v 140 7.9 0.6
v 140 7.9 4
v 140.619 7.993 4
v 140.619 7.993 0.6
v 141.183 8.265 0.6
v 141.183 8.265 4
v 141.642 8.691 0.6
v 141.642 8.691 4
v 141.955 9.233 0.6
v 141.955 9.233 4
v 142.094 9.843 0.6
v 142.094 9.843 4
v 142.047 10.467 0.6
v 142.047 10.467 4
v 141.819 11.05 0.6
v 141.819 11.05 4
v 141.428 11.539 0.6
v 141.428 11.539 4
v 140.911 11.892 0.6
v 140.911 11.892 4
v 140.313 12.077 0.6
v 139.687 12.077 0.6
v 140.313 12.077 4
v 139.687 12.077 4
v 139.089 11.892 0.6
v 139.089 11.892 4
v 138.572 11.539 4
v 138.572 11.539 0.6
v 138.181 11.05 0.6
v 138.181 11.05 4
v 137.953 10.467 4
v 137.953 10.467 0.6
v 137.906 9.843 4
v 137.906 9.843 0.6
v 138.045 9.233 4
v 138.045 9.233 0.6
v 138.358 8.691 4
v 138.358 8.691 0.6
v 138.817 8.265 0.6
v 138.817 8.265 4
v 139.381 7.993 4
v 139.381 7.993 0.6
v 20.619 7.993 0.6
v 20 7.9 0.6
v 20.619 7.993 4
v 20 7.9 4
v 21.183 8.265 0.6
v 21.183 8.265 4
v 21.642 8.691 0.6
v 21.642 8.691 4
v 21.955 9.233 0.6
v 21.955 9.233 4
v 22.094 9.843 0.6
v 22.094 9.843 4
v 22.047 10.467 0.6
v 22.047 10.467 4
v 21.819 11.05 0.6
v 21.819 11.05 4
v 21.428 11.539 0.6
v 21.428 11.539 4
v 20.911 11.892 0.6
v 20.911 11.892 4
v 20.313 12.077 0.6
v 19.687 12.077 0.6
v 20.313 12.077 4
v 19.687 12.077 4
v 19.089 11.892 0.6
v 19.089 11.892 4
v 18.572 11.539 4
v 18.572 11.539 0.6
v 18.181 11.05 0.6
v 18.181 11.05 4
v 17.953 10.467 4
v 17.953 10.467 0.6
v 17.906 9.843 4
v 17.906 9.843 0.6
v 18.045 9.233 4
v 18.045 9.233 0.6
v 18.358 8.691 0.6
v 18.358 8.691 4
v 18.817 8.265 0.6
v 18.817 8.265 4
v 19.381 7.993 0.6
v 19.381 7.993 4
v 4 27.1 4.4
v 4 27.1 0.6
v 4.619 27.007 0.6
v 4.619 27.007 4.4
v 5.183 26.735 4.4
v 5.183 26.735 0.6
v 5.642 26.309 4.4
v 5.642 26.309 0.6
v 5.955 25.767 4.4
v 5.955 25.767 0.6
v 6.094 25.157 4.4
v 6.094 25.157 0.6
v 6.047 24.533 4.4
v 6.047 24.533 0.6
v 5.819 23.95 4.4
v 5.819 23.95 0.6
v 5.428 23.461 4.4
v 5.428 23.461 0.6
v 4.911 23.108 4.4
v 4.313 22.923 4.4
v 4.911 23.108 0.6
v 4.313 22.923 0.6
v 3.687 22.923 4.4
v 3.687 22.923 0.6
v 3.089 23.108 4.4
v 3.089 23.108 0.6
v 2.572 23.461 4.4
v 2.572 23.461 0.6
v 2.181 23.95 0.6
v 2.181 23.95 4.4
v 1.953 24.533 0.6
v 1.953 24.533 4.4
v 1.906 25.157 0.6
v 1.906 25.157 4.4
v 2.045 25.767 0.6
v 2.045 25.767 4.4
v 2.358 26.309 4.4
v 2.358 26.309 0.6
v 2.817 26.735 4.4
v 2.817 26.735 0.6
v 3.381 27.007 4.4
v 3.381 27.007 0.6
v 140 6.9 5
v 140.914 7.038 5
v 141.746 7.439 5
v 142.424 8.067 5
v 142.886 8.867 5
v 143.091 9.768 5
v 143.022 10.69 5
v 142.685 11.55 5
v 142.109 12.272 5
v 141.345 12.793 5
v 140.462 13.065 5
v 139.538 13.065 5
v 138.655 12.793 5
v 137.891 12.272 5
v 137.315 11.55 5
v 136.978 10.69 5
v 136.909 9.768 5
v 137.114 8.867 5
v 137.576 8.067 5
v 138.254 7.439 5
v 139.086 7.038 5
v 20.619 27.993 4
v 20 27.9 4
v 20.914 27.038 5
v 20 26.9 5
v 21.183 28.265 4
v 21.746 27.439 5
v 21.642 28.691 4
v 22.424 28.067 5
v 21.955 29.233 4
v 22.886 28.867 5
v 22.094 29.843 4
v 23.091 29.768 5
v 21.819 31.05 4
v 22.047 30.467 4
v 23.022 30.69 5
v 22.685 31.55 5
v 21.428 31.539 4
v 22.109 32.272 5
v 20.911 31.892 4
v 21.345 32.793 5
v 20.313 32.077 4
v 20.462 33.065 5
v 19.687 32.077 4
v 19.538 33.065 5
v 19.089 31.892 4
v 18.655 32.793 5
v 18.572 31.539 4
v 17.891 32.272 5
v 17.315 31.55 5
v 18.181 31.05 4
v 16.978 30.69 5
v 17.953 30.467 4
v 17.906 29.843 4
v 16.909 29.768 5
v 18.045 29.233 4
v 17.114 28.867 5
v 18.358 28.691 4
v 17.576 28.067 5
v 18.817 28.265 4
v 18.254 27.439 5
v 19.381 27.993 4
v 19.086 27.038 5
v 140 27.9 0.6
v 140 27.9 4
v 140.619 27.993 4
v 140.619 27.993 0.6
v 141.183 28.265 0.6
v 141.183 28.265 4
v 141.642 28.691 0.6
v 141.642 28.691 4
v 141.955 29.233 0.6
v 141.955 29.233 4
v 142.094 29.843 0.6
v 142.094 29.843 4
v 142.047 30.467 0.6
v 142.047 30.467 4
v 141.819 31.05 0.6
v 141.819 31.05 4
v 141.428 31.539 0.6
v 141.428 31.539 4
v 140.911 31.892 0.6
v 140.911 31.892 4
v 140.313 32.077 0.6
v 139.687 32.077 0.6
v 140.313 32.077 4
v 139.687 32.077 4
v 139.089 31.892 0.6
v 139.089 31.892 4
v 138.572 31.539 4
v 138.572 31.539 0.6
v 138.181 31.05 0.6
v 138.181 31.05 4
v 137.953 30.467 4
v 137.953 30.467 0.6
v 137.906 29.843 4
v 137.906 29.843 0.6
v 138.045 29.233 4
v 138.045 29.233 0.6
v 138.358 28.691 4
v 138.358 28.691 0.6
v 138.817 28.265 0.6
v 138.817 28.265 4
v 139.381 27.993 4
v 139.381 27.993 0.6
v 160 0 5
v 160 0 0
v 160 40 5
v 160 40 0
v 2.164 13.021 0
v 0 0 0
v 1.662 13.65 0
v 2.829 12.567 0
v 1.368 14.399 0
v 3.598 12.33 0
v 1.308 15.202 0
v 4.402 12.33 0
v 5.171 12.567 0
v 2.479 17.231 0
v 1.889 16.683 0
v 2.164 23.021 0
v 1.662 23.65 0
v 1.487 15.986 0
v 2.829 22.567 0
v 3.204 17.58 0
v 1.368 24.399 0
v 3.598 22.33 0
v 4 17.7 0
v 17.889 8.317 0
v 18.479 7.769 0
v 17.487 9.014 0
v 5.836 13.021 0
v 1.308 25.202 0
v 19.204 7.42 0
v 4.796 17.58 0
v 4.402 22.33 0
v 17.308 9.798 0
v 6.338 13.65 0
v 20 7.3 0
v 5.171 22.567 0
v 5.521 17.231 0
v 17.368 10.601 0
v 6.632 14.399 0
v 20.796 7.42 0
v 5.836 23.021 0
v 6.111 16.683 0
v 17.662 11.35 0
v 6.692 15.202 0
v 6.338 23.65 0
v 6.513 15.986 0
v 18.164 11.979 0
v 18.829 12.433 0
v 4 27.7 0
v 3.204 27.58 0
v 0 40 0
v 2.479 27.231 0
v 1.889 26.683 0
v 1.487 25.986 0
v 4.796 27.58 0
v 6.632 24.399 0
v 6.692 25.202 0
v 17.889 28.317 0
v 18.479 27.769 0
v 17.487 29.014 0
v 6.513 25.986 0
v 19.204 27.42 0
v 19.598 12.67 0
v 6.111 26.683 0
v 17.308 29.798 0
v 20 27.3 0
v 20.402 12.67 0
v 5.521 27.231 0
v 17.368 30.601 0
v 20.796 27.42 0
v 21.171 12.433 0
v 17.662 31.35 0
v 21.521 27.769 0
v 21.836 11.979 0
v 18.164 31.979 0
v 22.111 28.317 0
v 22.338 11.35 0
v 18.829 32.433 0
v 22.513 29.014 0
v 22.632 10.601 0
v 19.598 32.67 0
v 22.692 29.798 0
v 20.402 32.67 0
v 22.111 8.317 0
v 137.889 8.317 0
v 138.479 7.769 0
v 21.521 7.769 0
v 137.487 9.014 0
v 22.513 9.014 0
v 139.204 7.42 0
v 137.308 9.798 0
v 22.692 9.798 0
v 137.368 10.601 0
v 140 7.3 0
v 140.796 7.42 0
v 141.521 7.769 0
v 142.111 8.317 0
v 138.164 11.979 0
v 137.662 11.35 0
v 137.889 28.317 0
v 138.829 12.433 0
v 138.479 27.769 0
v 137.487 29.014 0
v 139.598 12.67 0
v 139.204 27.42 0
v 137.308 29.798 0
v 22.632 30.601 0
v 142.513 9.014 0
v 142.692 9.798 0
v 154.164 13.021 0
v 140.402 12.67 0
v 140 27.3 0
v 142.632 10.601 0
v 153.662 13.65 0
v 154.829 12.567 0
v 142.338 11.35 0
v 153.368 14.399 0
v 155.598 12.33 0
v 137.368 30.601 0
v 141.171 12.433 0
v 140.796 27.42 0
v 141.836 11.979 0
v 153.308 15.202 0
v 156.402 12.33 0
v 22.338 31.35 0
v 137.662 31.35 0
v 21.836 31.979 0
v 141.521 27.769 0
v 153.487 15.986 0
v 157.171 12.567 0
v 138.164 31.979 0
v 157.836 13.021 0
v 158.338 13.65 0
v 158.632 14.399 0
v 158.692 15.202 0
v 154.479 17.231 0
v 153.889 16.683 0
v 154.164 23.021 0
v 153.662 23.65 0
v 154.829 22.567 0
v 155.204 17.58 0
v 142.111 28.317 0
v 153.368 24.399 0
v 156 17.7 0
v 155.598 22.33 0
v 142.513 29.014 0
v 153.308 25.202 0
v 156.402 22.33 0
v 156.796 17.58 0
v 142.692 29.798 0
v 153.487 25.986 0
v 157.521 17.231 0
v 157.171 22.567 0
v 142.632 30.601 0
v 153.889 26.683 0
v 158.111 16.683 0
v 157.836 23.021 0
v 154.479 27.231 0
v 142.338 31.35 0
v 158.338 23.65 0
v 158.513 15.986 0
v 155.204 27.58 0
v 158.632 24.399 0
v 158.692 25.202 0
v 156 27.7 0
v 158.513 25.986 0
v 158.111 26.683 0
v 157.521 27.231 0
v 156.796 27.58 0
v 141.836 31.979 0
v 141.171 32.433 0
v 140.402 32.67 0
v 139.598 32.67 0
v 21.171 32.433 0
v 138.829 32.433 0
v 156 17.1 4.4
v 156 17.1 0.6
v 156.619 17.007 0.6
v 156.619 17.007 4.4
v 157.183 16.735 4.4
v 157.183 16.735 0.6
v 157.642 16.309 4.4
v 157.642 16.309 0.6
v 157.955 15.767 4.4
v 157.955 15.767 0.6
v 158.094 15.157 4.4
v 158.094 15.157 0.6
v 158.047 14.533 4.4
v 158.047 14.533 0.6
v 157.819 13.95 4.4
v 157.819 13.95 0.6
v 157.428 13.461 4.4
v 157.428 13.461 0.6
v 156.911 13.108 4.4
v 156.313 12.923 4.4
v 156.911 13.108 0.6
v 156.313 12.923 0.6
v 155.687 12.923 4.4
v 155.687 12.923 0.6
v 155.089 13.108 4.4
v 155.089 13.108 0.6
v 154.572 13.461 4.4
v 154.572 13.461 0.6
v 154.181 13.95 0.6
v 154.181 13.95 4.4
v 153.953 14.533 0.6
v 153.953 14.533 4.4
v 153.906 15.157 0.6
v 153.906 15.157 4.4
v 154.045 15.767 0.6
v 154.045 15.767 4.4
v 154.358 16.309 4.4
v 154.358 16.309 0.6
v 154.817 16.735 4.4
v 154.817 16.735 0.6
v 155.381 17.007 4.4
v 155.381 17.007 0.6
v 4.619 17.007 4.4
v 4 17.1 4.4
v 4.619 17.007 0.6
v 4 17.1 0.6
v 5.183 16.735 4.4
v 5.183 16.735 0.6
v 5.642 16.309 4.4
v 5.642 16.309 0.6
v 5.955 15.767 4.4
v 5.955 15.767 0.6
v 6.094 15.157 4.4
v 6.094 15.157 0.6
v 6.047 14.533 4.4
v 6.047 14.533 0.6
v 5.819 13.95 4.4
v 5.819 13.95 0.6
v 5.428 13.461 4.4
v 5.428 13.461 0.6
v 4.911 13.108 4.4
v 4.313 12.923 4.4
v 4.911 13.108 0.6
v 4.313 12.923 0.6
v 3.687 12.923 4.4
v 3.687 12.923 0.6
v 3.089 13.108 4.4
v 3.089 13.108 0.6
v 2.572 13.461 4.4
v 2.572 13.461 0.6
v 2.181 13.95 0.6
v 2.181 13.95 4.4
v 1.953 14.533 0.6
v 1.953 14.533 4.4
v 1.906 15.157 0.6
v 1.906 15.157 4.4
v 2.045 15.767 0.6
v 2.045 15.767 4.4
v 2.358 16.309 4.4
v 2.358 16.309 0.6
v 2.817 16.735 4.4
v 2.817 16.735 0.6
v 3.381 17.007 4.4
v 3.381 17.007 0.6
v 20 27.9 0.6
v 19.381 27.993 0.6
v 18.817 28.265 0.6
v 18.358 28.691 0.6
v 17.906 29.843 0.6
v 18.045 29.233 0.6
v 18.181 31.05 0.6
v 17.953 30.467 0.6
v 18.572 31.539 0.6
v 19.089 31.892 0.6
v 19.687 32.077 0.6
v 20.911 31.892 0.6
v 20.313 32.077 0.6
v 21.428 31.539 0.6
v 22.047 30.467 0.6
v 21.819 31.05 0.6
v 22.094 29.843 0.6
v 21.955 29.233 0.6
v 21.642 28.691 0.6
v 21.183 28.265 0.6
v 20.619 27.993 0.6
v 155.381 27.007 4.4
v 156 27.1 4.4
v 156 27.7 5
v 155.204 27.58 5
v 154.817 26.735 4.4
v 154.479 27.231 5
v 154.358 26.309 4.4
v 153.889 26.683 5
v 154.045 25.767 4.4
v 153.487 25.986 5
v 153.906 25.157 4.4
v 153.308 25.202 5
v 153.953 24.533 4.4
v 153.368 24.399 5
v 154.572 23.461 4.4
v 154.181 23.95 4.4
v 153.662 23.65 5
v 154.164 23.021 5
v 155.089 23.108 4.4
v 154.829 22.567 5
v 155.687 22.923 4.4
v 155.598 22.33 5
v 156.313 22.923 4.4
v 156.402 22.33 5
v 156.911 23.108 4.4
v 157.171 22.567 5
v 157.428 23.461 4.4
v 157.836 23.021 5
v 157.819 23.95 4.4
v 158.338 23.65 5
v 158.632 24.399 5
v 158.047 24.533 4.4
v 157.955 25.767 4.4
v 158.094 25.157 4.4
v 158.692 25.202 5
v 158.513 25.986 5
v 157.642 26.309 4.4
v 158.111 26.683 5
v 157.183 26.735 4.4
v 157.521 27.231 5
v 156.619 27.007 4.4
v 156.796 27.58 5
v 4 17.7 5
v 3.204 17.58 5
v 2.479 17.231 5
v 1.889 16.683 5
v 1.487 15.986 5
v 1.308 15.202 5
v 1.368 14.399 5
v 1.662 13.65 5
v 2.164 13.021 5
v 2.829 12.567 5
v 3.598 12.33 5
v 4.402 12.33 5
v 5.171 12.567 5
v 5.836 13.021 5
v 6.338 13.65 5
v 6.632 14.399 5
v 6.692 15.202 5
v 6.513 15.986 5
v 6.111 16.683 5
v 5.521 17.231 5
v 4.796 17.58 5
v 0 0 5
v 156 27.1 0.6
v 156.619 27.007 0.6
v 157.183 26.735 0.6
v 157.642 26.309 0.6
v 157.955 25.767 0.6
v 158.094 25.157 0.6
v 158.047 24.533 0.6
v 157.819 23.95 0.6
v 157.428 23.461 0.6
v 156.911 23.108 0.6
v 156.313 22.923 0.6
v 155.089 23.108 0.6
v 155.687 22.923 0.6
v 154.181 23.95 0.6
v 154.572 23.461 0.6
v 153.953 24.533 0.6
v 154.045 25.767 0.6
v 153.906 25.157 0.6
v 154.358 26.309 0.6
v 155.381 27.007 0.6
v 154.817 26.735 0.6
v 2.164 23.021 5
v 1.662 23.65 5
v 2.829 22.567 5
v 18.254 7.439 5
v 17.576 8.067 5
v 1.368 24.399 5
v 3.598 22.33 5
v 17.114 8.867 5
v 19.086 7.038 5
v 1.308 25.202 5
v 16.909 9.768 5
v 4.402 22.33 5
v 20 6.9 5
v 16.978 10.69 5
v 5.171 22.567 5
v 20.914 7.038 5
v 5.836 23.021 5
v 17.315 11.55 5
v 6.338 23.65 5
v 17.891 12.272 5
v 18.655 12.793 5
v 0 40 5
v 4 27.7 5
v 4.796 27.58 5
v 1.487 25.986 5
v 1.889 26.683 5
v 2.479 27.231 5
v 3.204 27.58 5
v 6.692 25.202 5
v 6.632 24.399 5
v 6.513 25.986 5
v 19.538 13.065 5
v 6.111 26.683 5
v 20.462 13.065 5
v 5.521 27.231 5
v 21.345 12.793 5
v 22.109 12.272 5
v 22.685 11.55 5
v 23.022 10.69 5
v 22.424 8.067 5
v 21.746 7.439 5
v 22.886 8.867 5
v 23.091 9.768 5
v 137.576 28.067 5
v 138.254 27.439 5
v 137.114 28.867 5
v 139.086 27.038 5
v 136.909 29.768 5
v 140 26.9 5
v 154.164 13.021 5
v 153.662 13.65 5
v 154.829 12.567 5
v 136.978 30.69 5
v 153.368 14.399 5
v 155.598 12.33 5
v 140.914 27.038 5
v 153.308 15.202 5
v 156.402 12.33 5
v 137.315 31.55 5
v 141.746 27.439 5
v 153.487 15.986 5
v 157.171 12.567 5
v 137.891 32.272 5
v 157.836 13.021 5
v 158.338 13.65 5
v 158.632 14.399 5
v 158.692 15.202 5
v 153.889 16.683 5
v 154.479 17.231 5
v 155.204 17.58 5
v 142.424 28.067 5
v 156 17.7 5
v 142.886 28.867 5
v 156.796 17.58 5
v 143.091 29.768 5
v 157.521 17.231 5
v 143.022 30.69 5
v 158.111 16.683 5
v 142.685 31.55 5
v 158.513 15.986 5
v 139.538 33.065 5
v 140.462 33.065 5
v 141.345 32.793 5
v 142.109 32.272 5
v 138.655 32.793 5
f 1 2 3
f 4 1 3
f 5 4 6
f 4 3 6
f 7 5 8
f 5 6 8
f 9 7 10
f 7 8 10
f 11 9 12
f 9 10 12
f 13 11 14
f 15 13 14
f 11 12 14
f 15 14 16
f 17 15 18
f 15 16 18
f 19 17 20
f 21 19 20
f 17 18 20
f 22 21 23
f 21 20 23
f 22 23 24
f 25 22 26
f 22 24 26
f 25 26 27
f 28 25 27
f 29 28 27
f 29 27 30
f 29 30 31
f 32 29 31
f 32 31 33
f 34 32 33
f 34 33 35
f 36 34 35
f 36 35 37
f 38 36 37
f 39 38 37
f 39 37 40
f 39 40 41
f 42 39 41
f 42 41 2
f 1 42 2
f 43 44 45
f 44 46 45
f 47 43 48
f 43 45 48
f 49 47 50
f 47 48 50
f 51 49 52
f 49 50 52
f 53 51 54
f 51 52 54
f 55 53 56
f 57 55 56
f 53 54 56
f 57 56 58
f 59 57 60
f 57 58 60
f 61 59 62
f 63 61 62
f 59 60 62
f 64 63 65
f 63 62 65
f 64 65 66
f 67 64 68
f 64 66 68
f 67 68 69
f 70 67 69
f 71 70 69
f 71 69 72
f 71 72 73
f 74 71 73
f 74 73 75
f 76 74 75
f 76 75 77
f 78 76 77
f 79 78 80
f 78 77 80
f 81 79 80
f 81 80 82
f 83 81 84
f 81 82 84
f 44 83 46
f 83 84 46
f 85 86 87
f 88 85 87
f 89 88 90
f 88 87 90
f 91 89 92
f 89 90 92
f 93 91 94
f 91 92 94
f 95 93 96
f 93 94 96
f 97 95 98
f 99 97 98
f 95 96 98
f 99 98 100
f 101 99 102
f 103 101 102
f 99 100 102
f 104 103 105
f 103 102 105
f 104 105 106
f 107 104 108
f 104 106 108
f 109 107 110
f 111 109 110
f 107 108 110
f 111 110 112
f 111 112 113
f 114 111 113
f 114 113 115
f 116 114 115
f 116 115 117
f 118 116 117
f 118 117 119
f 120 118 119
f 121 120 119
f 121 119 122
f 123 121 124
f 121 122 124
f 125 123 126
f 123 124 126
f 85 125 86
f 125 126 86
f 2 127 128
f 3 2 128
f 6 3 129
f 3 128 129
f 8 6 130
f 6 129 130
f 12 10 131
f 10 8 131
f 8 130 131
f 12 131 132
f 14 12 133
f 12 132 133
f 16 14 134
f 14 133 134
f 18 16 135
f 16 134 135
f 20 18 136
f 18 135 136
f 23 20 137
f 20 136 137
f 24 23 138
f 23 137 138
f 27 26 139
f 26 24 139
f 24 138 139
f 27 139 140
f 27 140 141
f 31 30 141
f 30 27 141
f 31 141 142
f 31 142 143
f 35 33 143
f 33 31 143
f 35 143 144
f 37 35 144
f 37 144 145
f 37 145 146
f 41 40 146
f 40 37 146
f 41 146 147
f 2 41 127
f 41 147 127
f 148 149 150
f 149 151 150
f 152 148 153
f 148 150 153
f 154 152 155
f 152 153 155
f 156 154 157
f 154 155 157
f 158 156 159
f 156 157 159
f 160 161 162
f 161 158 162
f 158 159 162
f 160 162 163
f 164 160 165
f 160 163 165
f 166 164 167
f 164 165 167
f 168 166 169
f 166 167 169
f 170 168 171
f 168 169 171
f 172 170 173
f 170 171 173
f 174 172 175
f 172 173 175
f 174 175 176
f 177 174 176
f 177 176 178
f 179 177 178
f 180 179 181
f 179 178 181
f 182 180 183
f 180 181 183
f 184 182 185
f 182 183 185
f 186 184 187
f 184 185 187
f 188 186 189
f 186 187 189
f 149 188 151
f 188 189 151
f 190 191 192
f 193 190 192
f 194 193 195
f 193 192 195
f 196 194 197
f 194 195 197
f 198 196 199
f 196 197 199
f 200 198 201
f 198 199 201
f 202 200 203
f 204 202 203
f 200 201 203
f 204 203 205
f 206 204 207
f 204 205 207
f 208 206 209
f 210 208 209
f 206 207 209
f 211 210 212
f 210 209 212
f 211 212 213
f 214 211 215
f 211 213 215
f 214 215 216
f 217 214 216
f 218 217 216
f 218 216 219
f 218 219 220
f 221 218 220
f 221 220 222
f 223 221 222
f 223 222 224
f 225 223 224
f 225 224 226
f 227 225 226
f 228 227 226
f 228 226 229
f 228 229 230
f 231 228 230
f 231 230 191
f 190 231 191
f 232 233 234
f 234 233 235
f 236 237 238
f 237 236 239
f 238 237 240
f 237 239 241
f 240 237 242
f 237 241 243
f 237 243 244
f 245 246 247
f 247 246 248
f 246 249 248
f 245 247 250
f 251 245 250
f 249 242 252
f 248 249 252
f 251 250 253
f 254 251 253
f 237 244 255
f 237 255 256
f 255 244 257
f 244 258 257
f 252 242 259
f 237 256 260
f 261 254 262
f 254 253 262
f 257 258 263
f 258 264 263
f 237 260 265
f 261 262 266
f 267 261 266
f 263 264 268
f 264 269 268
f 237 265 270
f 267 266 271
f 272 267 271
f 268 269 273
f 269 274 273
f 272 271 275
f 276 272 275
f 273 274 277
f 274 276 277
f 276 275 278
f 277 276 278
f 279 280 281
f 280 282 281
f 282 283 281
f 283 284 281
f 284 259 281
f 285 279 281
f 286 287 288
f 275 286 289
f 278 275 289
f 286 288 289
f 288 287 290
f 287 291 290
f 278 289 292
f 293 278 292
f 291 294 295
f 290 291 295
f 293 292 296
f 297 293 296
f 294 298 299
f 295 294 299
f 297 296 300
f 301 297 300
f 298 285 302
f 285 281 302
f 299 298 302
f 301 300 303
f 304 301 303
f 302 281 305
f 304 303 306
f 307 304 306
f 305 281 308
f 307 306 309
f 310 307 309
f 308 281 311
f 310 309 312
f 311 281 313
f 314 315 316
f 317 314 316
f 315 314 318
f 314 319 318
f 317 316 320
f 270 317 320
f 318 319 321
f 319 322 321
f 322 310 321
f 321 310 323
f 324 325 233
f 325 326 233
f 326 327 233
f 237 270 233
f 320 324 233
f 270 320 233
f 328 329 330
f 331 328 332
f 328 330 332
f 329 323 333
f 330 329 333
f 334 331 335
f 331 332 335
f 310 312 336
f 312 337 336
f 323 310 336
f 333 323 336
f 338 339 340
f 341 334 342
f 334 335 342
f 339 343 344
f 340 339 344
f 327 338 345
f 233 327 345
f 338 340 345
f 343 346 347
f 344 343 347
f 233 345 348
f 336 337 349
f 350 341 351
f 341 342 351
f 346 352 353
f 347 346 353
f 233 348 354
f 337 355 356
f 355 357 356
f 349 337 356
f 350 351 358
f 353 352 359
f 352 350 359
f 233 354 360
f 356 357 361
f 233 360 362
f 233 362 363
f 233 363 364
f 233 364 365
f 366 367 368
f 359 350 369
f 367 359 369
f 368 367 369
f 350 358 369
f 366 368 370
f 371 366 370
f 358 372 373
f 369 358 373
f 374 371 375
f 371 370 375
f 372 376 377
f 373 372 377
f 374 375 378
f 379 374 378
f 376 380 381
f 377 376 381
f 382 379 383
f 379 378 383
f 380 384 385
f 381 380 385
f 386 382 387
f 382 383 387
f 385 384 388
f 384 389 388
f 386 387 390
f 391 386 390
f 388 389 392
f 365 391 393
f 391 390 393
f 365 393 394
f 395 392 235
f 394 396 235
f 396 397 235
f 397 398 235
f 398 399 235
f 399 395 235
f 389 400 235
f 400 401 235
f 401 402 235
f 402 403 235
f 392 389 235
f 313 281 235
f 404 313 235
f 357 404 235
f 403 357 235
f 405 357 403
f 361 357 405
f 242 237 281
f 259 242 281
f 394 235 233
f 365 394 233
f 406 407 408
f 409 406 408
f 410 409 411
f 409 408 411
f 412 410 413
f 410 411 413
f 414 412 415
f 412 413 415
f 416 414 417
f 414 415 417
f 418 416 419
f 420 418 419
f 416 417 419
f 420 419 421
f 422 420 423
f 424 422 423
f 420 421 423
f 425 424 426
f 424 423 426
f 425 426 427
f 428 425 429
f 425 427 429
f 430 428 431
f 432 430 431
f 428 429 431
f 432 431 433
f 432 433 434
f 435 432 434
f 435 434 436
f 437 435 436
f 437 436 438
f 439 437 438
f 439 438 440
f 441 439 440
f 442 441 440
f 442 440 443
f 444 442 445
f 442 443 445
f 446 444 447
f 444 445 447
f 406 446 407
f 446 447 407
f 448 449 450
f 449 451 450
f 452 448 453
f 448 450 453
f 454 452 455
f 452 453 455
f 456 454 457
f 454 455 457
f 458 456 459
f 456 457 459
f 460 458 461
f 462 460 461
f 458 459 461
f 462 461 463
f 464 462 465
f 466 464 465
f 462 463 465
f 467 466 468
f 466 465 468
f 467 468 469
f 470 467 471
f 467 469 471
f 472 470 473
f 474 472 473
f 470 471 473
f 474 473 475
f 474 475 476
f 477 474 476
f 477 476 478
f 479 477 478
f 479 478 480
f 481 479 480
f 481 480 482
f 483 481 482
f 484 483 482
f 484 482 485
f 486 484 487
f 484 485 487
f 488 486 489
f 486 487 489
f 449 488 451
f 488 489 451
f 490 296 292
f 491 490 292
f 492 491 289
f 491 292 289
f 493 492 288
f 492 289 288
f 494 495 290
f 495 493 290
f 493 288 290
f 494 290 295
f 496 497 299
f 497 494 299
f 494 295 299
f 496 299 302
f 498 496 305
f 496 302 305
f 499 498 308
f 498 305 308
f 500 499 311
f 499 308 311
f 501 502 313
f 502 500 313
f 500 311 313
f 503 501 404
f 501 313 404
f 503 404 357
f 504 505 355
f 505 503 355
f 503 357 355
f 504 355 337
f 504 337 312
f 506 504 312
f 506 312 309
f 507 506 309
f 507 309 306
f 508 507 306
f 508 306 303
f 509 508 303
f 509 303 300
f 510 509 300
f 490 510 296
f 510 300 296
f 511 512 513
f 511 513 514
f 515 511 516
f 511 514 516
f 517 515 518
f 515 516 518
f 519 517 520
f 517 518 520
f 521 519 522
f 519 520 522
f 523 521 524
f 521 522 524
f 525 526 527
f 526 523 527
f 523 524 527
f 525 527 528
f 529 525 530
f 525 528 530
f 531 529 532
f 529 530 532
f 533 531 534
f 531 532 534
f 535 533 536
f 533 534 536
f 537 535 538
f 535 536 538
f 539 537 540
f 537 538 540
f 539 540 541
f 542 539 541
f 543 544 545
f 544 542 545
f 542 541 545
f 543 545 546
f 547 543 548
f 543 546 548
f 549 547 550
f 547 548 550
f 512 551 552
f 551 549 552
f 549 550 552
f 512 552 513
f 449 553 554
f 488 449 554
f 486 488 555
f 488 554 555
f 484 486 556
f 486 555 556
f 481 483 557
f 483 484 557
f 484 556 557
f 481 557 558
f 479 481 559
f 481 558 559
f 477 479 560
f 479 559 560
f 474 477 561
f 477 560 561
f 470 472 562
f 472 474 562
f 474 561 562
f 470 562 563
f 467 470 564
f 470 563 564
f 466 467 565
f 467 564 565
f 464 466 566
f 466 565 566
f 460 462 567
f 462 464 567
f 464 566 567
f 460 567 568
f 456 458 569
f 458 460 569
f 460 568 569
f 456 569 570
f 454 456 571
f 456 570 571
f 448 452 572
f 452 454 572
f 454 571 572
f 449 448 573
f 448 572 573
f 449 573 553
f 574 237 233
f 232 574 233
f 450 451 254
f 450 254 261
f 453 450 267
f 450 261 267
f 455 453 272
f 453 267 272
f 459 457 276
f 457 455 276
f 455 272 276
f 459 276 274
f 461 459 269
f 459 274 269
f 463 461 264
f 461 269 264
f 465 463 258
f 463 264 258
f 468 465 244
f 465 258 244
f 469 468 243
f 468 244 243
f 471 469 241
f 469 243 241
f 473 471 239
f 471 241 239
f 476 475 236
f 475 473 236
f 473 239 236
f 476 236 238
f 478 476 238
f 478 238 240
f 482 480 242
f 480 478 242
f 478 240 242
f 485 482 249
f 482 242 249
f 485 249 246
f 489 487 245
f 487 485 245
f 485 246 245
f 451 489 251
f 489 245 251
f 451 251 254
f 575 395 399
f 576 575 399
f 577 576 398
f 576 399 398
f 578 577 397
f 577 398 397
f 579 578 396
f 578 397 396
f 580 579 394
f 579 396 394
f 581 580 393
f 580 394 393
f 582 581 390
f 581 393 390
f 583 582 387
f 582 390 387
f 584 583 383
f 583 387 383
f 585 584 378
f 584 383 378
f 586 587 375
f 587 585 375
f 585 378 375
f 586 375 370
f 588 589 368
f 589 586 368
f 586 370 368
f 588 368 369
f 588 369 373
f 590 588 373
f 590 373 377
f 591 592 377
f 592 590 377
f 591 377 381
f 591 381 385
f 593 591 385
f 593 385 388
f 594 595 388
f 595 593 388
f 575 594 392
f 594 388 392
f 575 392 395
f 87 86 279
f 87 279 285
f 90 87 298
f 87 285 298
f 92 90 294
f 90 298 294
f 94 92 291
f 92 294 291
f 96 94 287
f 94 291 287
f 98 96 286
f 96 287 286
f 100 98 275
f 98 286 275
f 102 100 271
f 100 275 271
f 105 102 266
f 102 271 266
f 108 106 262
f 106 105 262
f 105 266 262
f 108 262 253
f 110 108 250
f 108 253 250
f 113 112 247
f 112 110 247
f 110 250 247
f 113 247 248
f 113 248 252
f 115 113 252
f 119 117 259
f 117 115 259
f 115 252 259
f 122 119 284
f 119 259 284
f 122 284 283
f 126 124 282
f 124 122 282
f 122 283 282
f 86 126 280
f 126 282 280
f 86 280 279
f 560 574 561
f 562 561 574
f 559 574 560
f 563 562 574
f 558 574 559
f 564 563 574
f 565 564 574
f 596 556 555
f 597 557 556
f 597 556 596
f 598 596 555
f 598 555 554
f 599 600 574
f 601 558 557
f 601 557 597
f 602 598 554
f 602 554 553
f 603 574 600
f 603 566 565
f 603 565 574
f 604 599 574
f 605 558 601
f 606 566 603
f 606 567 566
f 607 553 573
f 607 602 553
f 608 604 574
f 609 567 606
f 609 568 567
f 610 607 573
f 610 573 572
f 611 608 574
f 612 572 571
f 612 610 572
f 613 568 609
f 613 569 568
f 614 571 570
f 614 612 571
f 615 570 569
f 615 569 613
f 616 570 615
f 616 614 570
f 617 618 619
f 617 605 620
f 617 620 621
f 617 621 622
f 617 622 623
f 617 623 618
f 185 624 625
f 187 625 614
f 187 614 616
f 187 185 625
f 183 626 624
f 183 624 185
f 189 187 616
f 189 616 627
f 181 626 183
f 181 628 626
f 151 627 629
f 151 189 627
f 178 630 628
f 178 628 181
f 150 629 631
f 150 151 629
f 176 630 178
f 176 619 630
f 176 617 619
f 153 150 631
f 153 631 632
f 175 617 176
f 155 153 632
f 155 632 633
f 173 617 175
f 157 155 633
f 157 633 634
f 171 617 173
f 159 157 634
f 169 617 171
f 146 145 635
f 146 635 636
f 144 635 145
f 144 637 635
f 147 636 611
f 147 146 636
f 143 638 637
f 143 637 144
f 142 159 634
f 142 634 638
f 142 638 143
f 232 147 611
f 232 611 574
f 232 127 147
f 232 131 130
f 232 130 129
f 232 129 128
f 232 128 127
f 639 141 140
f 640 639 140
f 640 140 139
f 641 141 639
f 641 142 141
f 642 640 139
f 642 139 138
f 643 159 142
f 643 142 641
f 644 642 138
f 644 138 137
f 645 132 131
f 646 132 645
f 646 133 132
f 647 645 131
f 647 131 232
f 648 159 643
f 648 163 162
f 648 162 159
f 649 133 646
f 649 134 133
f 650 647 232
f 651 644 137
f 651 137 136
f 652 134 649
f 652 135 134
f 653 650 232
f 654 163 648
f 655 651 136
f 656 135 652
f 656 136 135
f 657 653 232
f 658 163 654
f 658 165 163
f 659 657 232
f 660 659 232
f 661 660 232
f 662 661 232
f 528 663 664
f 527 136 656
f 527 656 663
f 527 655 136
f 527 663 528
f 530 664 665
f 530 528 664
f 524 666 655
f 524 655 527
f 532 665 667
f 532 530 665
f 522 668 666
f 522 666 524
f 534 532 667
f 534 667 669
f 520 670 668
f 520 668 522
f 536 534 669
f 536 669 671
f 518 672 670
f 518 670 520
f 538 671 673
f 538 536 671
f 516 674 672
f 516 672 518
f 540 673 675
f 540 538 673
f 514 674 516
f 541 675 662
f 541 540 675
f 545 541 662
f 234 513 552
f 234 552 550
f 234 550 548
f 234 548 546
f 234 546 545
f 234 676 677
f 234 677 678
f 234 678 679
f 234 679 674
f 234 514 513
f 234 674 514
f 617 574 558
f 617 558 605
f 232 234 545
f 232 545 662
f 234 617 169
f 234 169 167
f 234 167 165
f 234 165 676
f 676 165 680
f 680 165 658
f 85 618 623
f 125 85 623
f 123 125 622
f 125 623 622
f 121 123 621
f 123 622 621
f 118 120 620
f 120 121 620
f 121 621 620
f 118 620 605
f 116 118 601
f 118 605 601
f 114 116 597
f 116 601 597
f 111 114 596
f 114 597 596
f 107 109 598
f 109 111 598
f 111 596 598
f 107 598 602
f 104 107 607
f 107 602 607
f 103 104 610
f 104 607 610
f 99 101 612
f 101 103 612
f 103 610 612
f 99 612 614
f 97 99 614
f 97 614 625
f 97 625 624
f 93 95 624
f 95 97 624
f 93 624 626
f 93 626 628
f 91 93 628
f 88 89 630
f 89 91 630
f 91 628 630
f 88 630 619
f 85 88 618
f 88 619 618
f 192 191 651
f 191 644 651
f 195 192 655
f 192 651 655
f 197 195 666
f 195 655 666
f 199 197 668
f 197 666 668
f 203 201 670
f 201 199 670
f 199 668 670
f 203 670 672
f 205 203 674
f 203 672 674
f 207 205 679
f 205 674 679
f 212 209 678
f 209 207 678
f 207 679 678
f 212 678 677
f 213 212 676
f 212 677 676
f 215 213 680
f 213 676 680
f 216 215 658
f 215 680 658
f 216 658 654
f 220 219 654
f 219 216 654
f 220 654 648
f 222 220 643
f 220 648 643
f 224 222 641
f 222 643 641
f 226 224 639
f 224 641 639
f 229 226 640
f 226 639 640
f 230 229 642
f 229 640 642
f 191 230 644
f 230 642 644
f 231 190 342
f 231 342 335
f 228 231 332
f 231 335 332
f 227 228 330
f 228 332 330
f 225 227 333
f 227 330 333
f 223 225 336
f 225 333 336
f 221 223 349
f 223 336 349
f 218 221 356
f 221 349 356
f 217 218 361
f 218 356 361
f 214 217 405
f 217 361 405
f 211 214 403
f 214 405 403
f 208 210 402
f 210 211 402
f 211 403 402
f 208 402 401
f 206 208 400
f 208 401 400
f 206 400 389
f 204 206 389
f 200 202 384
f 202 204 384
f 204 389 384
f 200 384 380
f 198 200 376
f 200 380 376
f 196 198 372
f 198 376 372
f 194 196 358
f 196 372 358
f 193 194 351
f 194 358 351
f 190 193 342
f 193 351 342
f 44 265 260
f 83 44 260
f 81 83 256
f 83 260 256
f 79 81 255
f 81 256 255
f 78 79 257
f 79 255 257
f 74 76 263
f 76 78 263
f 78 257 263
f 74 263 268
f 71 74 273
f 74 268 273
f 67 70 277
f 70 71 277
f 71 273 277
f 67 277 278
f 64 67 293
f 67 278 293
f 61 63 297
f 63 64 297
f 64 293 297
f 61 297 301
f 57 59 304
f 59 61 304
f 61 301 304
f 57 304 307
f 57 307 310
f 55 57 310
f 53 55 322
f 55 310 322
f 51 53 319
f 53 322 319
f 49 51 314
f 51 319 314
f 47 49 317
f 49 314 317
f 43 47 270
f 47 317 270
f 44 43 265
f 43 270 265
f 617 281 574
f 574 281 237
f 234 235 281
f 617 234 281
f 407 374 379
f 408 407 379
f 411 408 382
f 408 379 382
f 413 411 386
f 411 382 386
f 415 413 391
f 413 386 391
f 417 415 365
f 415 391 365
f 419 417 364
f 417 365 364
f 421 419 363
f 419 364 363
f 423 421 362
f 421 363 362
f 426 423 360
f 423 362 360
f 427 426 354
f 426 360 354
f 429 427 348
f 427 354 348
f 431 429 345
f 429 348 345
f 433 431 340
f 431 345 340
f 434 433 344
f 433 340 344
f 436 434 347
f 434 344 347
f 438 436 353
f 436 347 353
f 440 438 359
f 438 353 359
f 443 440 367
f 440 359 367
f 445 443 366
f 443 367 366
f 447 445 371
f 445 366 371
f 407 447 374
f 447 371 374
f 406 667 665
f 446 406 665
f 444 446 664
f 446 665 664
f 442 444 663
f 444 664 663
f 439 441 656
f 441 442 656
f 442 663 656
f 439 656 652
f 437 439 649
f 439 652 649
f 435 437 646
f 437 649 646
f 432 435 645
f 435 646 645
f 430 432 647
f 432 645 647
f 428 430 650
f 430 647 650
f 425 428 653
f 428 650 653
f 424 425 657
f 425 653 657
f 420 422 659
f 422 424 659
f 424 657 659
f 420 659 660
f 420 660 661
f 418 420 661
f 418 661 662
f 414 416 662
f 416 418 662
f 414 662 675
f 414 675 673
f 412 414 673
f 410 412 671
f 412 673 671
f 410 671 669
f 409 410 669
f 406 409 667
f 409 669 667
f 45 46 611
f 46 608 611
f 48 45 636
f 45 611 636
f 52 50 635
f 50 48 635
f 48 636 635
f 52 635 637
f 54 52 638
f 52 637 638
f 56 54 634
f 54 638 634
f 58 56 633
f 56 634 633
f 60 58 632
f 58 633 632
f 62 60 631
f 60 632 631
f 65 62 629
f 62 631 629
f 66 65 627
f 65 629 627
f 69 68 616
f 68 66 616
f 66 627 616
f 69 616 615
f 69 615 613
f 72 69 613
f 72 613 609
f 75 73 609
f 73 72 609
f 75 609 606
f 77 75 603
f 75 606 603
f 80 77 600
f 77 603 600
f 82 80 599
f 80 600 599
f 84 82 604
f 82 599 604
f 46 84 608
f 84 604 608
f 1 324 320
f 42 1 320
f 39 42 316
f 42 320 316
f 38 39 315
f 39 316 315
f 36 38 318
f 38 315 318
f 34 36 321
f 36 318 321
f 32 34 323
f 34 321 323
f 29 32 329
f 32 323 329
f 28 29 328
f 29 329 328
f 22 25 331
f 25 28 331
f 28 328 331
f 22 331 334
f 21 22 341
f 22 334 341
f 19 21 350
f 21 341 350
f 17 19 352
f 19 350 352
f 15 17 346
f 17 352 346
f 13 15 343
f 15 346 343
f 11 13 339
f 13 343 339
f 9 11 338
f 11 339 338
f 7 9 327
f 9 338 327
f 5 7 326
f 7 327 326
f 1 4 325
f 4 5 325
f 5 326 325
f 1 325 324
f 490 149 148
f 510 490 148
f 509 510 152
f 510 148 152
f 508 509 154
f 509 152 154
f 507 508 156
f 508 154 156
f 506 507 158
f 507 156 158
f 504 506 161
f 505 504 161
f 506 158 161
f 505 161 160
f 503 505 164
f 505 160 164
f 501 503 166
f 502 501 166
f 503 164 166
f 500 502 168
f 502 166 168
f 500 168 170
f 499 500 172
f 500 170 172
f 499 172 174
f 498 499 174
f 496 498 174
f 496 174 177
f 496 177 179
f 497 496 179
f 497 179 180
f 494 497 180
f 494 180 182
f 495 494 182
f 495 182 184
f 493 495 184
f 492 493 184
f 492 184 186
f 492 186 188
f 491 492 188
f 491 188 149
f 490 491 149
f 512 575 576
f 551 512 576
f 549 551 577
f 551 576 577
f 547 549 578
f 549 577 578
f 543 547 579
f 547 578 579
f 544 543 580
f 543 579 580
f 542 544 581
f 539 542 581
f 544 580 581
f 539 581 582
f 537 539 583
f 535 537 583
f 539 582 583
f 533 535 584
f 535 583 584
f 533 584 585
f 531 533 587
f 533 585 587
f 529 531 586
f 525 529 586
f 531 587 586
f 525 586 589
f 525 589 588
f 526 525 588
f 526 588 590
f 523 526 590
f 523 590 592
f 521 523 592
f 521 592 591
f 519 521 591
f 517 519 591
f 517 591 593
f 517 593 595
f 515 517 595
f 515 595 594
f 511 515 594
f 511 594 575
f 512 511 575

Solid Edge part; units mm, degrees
sketch "Sketch1" plane through (0, 0, 0) normal (0, 0, 1) x (1, 0, 0)
  line L0 (160, 0) -> (160, 40)
  line L1 (160, 40) -> (0, 40)
  line L2 (0, 40) -> (0, 0)
  line L3 (0, 0) -> (160, 0)
extrude "Protrusion1" add sketch "Sketch1" along normal blind 5
hole "Hole_2" at (20, 10, 5) direction (0, 0, -1) diameter 4.2 end up to next start chamfer 1 start chamfer angle 45 end chamfer 0.6 end chamfer angle 45
hole "Hole1" at (140, 10, 5) direction (0, 0, -1) diameter 4.2 end up to next start chamfer 1 start chamfer angle 45 end chamfer 0.6 end chamfer angle 45
hole "Hole2" at (140, 30, 5) direction (0, 0, -1) diameter 4.2 end up to next start chamfer 1 start chamfer angle 45 end chamfer 0.6 end chamfer angle 45
hole "Hole3" at (20, 30, 5) direction (0, 0, -1) diameter 4.2 end up to next start chamfer 1 start chamfer angle 45 end chamfer 0.6 end chamfer angle 45
hole "Hole_10" at (156, 25, 0) direction (0, 0, 1) diameter 4.2 end up to next start chamfer 0.6 start chamfer angle 45 end chamfer 0.6 end chamfer angle 45
hole "Hole4" at (4, 25, 0) direction (0, 0, 1) diameter 4.2 end up to next start chamfer 0.6 start chamfer angle 45 end chamfer 0.6 end chamfer angle 45
hole "Hole5" at (4, 15, 0) direction (0, 0, 1) diameter 4.2 end up to next start chamfer 0.6 start chamfer angle 45 end chamfer 0.6 end chamfer angle 45
hole "Hole6" at (156, 15, 0) direction (0, 0, 1) diameter 4.2 end up to next start chamfer 0.6 start chamfer angle 45 end chamfer 0.6 end chamfer angle 45
